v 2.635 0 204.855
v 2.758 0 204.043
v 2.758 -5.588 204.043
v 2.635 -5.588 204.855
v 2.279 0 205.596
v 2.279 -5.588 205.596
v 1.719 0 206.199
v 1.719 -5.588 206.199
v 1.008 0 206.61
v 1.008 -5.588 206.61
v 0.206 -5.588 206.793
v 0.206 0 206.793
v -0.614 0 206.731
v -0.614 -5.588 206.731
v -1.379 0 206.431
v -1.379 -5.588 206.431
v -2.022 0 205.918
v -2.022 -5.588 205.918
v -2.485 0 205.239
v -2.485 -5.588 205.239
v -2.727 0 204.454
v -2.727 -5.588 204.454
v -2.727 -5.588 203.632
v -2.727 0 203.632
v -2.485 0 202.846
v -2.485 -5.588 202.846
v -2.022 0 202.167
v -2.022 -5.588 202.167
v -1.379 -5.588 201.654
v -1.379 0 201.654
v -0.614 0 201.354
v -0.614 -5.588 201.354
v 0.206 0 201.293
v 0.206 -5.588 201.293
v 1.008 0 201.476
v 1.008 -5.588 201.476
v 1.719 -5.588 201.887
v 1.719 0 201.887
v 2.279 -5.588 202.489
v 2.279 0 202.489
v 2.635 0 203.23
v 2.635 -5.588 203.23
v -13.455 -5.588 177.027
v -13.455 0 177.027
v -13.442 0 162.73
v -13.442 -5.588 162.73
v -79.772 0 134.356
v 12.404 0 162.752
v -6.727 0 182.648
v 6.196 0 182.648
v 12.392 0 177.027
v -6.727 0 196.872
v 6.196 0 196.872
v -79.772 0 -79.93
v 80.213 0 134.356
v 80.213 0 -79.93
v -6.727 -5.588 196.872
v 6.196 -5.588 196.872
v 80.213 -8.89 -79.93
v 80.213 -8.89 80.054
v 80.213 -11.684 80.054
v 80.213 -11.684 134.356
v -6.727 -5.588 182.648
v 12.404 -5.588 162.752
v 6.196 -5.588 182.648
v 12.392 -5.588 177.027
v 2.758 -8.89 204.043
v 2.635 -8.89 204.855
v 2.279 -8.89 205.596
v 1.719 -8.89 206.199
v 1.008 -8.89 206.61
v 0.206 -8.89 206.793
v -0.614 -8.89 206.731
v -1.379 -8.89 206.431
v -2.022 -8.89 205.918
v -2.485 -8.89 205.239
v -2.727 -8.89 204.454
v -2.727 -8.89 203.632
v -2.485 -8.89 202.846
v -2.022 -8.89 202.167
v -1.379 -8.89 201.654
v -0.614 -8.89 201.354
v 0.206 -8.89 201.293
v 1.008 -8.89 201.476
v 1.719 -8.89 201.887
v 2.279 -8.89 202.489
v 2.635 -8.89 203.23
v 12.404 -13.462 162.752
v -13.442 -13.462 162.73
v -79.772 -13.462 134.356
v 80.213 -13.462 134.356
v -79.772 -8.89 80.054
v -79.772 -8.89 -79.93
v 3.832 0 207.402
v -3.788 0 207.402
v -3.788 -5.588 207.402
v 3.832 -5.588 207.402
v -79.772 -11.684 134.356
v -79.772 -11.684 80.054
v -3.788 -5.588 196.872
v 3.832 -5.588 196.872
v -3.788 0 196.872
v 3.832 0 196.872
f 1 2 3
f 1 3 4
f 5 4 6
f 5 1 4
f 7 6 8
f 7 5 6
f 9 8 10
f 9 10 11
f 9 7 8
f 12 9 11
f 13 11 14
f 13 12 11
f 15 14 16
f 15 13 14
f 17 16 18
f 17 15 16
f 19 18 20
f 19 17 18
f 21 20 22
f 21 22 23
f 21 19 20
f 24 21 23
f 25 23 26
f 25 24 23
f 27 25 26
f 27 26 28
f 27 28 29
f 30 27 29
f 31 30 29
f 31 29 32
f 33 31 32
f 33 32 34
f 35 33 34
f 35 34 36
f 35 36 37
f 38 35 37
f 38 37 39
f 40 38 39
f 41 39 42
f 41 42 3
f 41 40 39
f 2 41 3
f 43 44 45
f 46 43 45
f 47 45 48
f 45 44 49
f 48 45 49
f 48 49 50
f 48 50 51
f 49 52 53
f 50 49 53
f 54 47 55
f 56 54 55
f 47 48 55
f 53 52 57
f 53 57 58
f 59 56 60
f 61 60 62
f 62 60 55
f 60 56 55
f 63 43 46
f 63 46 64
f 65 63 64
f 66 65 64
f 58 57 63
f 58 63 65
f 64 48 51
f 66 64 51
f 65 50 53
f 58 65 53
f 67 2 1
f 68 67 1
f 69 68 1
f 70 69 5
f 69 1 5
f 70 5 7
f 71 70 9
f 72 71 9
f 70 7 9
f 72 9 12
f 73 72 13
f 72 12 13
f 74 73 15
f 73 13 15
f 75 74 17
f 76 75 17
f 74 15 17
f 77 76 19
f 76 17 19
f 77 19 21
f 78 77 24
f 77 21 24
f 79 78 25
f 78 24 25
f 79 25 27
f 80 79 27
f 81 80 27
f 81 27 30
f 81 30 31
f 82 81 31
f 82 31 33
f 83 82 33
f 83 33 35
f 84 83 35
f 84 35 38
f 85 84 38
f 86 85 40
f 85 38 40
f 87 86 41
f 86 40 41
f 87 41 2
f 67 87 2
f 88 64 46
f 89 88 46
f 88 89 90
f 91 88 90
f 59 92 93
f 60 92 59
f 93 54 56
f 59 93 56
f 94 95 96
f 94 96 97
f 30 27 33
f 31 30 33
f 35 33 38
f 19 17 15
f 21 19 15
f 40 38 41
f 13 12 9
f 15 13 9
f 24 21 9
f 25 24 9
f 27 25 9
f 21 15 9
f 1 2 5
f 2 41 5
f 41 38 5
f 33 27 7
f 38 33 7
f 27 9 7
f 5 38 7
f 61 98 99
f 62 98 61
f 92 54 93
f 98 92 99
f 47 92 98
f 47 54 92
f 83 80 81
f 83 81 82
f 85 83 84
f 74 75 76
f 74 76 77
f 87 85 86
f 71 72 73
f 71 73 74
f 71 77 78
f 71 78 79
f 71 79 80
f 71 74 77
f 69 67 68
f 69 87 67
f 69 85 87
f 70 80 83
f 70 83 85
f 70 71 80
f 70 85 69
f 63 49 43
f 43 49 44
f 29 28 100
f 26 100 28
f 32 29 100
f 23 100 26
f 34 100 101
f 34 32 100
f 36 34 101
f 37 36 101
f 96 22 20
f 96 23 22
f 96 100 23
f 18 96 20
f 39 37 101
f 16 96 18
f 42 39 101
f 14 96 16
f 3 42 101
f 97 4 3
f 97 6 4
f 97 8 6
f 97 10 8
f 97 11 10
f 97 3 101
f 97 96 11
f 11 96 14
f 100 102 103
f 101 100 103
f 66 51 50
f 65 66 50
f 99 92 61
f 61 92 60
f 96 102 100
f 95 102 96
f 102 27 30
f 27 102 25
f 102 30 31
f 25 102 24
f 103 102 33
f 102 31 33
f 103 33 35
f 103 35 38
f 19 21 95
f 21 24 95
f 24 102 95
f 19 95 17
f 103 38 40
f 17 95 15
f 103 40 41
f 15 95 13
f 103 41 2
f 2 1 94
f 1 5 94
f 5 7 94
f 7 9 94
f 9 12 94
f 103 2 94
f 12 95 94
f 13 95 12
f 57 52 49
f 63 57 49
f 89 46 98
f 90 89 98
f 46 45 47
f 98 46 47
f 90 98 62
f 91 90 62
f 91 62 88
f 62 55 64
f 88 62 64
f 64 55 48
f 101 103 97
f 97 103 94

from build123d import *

# Parameters (mm, degrees)
F0_W     = 159.9845605834
F0_H     = 159.9845605834
F1_DEPTH = 8.89
F0_H_2   = 54.3017156402
F2_DEPTH = 11.684
F3_DEPTH = 13.462
F4_DEPTH = 5.588
F5_DEPTH = 5.588
F6_DEPTH = 5.588
F0_W_2   = 7.62
F0_H_3   = 4.110747473
F7_DEPTH = 5.588
F0_R     = 2.7577220522
F8_DEPTH = 8.89
F0_H_4   = 10.5306715801
F9_DEPTH = 5.588


with BuildPart() as f1:
    # F0 (on Front) → F1 (new body)
    with BuildSketch(Plane.XZ):
        with Locations((0.2204851322, 0.061805434)):
            Rectangle(F0_W, F0_H)
    extrude(amount=F1_DEPTH)

    # F0 (on Front) → F2 (join)
    with BuildSketch(Plane.XZ):
        with Locations((0.2204851322, 107.2049435458)):
            Rectangle(F0_W, F0_H_2)
    extrude(amount=F2_DEPTH)

    # F0 (on Front) → F3 (join)
    with BuildSketch(Plane.XZ):
        Polygon((-79.7717951595, 134.3558013658), (80.2127654239, 134.3558013658), (12.4039688199, 162.7520798121), (-13.4423059487, 162.7298990929), align=None)
    extrude(amount=F3_DEPTH)

    # F0 (on Front) → F4 (join)
    with BuildSketch(Plane.XZ):
        Polygon((-13.4423059487, 162.7298990929), (12.4039688199, 162.7520798121), (12.39171856, 177.0268009339), (-13.4545752436, 177.0268009339), align=None)
    extrude(amount=F4_DEPTH)

    # F0 (on Front) → F5 (join)
    with BuildSketch(Plane.XZ):
        Polygon((-13.4545752436, 177.0268009339), (12.39171856, 177.0268009339), (6.19585928, 182.6477961476), (0, 188.2687913613), (-6.7272876218, 182.6477961476), align=None)
    extrude(amount=F5_DEPTH)

    # F0 (on Front) → F6 (join)
    with BuildSketch(Plane.XZ):
        Polygon((0, 188.2687913613), (6.19585928, 182.6477961476), (6.19585928, 196.8717961476), (3.8324496233, 196.8717961476), (3.8324496233, 192.7610486746), (-3.7875503767, 192.7610486746), (-3.7875503767, 196.8717961476), (-6.7272876218, 196.8717961476), (-6.7272876218, 182.6477961476), align=None)
    extrude(amount=F6_DEPTH)

    # F0 (on Front) → F7 (join)
    with BuildSketch(Plane.XZ):
        with Locations((0.0224496233, 194.8164224111)):
            Rectangle(F0_W_2, F0_H_3)
    extrude(amount=F7_DEPTH)


with BuildPart() as f8:
    # F0 (on Front) → F8 (new body)
    with BuildSketch(Plane.XZ):
        with Locations((0, 204.0426135063)):
            Circle(F0_R)
    extrude(amount=F8_DEPTH)


with BuildPart() as f9:
    # F0 (on Front) → F9 (new body)
    with BuildSketch(Plane.XZ):
        with Locations((0.0224496233, 202.1371319376)):
            Rectangle(F0_W_2, F0_H_4)
        with Locations((0, 204.0426135063)):
            Circle(F0_R, mode=Mode.SUBTRACT)
    extrude(amount=F9_DEPTH)


solid = Compound([f1.part, f8.part, f9.part])
